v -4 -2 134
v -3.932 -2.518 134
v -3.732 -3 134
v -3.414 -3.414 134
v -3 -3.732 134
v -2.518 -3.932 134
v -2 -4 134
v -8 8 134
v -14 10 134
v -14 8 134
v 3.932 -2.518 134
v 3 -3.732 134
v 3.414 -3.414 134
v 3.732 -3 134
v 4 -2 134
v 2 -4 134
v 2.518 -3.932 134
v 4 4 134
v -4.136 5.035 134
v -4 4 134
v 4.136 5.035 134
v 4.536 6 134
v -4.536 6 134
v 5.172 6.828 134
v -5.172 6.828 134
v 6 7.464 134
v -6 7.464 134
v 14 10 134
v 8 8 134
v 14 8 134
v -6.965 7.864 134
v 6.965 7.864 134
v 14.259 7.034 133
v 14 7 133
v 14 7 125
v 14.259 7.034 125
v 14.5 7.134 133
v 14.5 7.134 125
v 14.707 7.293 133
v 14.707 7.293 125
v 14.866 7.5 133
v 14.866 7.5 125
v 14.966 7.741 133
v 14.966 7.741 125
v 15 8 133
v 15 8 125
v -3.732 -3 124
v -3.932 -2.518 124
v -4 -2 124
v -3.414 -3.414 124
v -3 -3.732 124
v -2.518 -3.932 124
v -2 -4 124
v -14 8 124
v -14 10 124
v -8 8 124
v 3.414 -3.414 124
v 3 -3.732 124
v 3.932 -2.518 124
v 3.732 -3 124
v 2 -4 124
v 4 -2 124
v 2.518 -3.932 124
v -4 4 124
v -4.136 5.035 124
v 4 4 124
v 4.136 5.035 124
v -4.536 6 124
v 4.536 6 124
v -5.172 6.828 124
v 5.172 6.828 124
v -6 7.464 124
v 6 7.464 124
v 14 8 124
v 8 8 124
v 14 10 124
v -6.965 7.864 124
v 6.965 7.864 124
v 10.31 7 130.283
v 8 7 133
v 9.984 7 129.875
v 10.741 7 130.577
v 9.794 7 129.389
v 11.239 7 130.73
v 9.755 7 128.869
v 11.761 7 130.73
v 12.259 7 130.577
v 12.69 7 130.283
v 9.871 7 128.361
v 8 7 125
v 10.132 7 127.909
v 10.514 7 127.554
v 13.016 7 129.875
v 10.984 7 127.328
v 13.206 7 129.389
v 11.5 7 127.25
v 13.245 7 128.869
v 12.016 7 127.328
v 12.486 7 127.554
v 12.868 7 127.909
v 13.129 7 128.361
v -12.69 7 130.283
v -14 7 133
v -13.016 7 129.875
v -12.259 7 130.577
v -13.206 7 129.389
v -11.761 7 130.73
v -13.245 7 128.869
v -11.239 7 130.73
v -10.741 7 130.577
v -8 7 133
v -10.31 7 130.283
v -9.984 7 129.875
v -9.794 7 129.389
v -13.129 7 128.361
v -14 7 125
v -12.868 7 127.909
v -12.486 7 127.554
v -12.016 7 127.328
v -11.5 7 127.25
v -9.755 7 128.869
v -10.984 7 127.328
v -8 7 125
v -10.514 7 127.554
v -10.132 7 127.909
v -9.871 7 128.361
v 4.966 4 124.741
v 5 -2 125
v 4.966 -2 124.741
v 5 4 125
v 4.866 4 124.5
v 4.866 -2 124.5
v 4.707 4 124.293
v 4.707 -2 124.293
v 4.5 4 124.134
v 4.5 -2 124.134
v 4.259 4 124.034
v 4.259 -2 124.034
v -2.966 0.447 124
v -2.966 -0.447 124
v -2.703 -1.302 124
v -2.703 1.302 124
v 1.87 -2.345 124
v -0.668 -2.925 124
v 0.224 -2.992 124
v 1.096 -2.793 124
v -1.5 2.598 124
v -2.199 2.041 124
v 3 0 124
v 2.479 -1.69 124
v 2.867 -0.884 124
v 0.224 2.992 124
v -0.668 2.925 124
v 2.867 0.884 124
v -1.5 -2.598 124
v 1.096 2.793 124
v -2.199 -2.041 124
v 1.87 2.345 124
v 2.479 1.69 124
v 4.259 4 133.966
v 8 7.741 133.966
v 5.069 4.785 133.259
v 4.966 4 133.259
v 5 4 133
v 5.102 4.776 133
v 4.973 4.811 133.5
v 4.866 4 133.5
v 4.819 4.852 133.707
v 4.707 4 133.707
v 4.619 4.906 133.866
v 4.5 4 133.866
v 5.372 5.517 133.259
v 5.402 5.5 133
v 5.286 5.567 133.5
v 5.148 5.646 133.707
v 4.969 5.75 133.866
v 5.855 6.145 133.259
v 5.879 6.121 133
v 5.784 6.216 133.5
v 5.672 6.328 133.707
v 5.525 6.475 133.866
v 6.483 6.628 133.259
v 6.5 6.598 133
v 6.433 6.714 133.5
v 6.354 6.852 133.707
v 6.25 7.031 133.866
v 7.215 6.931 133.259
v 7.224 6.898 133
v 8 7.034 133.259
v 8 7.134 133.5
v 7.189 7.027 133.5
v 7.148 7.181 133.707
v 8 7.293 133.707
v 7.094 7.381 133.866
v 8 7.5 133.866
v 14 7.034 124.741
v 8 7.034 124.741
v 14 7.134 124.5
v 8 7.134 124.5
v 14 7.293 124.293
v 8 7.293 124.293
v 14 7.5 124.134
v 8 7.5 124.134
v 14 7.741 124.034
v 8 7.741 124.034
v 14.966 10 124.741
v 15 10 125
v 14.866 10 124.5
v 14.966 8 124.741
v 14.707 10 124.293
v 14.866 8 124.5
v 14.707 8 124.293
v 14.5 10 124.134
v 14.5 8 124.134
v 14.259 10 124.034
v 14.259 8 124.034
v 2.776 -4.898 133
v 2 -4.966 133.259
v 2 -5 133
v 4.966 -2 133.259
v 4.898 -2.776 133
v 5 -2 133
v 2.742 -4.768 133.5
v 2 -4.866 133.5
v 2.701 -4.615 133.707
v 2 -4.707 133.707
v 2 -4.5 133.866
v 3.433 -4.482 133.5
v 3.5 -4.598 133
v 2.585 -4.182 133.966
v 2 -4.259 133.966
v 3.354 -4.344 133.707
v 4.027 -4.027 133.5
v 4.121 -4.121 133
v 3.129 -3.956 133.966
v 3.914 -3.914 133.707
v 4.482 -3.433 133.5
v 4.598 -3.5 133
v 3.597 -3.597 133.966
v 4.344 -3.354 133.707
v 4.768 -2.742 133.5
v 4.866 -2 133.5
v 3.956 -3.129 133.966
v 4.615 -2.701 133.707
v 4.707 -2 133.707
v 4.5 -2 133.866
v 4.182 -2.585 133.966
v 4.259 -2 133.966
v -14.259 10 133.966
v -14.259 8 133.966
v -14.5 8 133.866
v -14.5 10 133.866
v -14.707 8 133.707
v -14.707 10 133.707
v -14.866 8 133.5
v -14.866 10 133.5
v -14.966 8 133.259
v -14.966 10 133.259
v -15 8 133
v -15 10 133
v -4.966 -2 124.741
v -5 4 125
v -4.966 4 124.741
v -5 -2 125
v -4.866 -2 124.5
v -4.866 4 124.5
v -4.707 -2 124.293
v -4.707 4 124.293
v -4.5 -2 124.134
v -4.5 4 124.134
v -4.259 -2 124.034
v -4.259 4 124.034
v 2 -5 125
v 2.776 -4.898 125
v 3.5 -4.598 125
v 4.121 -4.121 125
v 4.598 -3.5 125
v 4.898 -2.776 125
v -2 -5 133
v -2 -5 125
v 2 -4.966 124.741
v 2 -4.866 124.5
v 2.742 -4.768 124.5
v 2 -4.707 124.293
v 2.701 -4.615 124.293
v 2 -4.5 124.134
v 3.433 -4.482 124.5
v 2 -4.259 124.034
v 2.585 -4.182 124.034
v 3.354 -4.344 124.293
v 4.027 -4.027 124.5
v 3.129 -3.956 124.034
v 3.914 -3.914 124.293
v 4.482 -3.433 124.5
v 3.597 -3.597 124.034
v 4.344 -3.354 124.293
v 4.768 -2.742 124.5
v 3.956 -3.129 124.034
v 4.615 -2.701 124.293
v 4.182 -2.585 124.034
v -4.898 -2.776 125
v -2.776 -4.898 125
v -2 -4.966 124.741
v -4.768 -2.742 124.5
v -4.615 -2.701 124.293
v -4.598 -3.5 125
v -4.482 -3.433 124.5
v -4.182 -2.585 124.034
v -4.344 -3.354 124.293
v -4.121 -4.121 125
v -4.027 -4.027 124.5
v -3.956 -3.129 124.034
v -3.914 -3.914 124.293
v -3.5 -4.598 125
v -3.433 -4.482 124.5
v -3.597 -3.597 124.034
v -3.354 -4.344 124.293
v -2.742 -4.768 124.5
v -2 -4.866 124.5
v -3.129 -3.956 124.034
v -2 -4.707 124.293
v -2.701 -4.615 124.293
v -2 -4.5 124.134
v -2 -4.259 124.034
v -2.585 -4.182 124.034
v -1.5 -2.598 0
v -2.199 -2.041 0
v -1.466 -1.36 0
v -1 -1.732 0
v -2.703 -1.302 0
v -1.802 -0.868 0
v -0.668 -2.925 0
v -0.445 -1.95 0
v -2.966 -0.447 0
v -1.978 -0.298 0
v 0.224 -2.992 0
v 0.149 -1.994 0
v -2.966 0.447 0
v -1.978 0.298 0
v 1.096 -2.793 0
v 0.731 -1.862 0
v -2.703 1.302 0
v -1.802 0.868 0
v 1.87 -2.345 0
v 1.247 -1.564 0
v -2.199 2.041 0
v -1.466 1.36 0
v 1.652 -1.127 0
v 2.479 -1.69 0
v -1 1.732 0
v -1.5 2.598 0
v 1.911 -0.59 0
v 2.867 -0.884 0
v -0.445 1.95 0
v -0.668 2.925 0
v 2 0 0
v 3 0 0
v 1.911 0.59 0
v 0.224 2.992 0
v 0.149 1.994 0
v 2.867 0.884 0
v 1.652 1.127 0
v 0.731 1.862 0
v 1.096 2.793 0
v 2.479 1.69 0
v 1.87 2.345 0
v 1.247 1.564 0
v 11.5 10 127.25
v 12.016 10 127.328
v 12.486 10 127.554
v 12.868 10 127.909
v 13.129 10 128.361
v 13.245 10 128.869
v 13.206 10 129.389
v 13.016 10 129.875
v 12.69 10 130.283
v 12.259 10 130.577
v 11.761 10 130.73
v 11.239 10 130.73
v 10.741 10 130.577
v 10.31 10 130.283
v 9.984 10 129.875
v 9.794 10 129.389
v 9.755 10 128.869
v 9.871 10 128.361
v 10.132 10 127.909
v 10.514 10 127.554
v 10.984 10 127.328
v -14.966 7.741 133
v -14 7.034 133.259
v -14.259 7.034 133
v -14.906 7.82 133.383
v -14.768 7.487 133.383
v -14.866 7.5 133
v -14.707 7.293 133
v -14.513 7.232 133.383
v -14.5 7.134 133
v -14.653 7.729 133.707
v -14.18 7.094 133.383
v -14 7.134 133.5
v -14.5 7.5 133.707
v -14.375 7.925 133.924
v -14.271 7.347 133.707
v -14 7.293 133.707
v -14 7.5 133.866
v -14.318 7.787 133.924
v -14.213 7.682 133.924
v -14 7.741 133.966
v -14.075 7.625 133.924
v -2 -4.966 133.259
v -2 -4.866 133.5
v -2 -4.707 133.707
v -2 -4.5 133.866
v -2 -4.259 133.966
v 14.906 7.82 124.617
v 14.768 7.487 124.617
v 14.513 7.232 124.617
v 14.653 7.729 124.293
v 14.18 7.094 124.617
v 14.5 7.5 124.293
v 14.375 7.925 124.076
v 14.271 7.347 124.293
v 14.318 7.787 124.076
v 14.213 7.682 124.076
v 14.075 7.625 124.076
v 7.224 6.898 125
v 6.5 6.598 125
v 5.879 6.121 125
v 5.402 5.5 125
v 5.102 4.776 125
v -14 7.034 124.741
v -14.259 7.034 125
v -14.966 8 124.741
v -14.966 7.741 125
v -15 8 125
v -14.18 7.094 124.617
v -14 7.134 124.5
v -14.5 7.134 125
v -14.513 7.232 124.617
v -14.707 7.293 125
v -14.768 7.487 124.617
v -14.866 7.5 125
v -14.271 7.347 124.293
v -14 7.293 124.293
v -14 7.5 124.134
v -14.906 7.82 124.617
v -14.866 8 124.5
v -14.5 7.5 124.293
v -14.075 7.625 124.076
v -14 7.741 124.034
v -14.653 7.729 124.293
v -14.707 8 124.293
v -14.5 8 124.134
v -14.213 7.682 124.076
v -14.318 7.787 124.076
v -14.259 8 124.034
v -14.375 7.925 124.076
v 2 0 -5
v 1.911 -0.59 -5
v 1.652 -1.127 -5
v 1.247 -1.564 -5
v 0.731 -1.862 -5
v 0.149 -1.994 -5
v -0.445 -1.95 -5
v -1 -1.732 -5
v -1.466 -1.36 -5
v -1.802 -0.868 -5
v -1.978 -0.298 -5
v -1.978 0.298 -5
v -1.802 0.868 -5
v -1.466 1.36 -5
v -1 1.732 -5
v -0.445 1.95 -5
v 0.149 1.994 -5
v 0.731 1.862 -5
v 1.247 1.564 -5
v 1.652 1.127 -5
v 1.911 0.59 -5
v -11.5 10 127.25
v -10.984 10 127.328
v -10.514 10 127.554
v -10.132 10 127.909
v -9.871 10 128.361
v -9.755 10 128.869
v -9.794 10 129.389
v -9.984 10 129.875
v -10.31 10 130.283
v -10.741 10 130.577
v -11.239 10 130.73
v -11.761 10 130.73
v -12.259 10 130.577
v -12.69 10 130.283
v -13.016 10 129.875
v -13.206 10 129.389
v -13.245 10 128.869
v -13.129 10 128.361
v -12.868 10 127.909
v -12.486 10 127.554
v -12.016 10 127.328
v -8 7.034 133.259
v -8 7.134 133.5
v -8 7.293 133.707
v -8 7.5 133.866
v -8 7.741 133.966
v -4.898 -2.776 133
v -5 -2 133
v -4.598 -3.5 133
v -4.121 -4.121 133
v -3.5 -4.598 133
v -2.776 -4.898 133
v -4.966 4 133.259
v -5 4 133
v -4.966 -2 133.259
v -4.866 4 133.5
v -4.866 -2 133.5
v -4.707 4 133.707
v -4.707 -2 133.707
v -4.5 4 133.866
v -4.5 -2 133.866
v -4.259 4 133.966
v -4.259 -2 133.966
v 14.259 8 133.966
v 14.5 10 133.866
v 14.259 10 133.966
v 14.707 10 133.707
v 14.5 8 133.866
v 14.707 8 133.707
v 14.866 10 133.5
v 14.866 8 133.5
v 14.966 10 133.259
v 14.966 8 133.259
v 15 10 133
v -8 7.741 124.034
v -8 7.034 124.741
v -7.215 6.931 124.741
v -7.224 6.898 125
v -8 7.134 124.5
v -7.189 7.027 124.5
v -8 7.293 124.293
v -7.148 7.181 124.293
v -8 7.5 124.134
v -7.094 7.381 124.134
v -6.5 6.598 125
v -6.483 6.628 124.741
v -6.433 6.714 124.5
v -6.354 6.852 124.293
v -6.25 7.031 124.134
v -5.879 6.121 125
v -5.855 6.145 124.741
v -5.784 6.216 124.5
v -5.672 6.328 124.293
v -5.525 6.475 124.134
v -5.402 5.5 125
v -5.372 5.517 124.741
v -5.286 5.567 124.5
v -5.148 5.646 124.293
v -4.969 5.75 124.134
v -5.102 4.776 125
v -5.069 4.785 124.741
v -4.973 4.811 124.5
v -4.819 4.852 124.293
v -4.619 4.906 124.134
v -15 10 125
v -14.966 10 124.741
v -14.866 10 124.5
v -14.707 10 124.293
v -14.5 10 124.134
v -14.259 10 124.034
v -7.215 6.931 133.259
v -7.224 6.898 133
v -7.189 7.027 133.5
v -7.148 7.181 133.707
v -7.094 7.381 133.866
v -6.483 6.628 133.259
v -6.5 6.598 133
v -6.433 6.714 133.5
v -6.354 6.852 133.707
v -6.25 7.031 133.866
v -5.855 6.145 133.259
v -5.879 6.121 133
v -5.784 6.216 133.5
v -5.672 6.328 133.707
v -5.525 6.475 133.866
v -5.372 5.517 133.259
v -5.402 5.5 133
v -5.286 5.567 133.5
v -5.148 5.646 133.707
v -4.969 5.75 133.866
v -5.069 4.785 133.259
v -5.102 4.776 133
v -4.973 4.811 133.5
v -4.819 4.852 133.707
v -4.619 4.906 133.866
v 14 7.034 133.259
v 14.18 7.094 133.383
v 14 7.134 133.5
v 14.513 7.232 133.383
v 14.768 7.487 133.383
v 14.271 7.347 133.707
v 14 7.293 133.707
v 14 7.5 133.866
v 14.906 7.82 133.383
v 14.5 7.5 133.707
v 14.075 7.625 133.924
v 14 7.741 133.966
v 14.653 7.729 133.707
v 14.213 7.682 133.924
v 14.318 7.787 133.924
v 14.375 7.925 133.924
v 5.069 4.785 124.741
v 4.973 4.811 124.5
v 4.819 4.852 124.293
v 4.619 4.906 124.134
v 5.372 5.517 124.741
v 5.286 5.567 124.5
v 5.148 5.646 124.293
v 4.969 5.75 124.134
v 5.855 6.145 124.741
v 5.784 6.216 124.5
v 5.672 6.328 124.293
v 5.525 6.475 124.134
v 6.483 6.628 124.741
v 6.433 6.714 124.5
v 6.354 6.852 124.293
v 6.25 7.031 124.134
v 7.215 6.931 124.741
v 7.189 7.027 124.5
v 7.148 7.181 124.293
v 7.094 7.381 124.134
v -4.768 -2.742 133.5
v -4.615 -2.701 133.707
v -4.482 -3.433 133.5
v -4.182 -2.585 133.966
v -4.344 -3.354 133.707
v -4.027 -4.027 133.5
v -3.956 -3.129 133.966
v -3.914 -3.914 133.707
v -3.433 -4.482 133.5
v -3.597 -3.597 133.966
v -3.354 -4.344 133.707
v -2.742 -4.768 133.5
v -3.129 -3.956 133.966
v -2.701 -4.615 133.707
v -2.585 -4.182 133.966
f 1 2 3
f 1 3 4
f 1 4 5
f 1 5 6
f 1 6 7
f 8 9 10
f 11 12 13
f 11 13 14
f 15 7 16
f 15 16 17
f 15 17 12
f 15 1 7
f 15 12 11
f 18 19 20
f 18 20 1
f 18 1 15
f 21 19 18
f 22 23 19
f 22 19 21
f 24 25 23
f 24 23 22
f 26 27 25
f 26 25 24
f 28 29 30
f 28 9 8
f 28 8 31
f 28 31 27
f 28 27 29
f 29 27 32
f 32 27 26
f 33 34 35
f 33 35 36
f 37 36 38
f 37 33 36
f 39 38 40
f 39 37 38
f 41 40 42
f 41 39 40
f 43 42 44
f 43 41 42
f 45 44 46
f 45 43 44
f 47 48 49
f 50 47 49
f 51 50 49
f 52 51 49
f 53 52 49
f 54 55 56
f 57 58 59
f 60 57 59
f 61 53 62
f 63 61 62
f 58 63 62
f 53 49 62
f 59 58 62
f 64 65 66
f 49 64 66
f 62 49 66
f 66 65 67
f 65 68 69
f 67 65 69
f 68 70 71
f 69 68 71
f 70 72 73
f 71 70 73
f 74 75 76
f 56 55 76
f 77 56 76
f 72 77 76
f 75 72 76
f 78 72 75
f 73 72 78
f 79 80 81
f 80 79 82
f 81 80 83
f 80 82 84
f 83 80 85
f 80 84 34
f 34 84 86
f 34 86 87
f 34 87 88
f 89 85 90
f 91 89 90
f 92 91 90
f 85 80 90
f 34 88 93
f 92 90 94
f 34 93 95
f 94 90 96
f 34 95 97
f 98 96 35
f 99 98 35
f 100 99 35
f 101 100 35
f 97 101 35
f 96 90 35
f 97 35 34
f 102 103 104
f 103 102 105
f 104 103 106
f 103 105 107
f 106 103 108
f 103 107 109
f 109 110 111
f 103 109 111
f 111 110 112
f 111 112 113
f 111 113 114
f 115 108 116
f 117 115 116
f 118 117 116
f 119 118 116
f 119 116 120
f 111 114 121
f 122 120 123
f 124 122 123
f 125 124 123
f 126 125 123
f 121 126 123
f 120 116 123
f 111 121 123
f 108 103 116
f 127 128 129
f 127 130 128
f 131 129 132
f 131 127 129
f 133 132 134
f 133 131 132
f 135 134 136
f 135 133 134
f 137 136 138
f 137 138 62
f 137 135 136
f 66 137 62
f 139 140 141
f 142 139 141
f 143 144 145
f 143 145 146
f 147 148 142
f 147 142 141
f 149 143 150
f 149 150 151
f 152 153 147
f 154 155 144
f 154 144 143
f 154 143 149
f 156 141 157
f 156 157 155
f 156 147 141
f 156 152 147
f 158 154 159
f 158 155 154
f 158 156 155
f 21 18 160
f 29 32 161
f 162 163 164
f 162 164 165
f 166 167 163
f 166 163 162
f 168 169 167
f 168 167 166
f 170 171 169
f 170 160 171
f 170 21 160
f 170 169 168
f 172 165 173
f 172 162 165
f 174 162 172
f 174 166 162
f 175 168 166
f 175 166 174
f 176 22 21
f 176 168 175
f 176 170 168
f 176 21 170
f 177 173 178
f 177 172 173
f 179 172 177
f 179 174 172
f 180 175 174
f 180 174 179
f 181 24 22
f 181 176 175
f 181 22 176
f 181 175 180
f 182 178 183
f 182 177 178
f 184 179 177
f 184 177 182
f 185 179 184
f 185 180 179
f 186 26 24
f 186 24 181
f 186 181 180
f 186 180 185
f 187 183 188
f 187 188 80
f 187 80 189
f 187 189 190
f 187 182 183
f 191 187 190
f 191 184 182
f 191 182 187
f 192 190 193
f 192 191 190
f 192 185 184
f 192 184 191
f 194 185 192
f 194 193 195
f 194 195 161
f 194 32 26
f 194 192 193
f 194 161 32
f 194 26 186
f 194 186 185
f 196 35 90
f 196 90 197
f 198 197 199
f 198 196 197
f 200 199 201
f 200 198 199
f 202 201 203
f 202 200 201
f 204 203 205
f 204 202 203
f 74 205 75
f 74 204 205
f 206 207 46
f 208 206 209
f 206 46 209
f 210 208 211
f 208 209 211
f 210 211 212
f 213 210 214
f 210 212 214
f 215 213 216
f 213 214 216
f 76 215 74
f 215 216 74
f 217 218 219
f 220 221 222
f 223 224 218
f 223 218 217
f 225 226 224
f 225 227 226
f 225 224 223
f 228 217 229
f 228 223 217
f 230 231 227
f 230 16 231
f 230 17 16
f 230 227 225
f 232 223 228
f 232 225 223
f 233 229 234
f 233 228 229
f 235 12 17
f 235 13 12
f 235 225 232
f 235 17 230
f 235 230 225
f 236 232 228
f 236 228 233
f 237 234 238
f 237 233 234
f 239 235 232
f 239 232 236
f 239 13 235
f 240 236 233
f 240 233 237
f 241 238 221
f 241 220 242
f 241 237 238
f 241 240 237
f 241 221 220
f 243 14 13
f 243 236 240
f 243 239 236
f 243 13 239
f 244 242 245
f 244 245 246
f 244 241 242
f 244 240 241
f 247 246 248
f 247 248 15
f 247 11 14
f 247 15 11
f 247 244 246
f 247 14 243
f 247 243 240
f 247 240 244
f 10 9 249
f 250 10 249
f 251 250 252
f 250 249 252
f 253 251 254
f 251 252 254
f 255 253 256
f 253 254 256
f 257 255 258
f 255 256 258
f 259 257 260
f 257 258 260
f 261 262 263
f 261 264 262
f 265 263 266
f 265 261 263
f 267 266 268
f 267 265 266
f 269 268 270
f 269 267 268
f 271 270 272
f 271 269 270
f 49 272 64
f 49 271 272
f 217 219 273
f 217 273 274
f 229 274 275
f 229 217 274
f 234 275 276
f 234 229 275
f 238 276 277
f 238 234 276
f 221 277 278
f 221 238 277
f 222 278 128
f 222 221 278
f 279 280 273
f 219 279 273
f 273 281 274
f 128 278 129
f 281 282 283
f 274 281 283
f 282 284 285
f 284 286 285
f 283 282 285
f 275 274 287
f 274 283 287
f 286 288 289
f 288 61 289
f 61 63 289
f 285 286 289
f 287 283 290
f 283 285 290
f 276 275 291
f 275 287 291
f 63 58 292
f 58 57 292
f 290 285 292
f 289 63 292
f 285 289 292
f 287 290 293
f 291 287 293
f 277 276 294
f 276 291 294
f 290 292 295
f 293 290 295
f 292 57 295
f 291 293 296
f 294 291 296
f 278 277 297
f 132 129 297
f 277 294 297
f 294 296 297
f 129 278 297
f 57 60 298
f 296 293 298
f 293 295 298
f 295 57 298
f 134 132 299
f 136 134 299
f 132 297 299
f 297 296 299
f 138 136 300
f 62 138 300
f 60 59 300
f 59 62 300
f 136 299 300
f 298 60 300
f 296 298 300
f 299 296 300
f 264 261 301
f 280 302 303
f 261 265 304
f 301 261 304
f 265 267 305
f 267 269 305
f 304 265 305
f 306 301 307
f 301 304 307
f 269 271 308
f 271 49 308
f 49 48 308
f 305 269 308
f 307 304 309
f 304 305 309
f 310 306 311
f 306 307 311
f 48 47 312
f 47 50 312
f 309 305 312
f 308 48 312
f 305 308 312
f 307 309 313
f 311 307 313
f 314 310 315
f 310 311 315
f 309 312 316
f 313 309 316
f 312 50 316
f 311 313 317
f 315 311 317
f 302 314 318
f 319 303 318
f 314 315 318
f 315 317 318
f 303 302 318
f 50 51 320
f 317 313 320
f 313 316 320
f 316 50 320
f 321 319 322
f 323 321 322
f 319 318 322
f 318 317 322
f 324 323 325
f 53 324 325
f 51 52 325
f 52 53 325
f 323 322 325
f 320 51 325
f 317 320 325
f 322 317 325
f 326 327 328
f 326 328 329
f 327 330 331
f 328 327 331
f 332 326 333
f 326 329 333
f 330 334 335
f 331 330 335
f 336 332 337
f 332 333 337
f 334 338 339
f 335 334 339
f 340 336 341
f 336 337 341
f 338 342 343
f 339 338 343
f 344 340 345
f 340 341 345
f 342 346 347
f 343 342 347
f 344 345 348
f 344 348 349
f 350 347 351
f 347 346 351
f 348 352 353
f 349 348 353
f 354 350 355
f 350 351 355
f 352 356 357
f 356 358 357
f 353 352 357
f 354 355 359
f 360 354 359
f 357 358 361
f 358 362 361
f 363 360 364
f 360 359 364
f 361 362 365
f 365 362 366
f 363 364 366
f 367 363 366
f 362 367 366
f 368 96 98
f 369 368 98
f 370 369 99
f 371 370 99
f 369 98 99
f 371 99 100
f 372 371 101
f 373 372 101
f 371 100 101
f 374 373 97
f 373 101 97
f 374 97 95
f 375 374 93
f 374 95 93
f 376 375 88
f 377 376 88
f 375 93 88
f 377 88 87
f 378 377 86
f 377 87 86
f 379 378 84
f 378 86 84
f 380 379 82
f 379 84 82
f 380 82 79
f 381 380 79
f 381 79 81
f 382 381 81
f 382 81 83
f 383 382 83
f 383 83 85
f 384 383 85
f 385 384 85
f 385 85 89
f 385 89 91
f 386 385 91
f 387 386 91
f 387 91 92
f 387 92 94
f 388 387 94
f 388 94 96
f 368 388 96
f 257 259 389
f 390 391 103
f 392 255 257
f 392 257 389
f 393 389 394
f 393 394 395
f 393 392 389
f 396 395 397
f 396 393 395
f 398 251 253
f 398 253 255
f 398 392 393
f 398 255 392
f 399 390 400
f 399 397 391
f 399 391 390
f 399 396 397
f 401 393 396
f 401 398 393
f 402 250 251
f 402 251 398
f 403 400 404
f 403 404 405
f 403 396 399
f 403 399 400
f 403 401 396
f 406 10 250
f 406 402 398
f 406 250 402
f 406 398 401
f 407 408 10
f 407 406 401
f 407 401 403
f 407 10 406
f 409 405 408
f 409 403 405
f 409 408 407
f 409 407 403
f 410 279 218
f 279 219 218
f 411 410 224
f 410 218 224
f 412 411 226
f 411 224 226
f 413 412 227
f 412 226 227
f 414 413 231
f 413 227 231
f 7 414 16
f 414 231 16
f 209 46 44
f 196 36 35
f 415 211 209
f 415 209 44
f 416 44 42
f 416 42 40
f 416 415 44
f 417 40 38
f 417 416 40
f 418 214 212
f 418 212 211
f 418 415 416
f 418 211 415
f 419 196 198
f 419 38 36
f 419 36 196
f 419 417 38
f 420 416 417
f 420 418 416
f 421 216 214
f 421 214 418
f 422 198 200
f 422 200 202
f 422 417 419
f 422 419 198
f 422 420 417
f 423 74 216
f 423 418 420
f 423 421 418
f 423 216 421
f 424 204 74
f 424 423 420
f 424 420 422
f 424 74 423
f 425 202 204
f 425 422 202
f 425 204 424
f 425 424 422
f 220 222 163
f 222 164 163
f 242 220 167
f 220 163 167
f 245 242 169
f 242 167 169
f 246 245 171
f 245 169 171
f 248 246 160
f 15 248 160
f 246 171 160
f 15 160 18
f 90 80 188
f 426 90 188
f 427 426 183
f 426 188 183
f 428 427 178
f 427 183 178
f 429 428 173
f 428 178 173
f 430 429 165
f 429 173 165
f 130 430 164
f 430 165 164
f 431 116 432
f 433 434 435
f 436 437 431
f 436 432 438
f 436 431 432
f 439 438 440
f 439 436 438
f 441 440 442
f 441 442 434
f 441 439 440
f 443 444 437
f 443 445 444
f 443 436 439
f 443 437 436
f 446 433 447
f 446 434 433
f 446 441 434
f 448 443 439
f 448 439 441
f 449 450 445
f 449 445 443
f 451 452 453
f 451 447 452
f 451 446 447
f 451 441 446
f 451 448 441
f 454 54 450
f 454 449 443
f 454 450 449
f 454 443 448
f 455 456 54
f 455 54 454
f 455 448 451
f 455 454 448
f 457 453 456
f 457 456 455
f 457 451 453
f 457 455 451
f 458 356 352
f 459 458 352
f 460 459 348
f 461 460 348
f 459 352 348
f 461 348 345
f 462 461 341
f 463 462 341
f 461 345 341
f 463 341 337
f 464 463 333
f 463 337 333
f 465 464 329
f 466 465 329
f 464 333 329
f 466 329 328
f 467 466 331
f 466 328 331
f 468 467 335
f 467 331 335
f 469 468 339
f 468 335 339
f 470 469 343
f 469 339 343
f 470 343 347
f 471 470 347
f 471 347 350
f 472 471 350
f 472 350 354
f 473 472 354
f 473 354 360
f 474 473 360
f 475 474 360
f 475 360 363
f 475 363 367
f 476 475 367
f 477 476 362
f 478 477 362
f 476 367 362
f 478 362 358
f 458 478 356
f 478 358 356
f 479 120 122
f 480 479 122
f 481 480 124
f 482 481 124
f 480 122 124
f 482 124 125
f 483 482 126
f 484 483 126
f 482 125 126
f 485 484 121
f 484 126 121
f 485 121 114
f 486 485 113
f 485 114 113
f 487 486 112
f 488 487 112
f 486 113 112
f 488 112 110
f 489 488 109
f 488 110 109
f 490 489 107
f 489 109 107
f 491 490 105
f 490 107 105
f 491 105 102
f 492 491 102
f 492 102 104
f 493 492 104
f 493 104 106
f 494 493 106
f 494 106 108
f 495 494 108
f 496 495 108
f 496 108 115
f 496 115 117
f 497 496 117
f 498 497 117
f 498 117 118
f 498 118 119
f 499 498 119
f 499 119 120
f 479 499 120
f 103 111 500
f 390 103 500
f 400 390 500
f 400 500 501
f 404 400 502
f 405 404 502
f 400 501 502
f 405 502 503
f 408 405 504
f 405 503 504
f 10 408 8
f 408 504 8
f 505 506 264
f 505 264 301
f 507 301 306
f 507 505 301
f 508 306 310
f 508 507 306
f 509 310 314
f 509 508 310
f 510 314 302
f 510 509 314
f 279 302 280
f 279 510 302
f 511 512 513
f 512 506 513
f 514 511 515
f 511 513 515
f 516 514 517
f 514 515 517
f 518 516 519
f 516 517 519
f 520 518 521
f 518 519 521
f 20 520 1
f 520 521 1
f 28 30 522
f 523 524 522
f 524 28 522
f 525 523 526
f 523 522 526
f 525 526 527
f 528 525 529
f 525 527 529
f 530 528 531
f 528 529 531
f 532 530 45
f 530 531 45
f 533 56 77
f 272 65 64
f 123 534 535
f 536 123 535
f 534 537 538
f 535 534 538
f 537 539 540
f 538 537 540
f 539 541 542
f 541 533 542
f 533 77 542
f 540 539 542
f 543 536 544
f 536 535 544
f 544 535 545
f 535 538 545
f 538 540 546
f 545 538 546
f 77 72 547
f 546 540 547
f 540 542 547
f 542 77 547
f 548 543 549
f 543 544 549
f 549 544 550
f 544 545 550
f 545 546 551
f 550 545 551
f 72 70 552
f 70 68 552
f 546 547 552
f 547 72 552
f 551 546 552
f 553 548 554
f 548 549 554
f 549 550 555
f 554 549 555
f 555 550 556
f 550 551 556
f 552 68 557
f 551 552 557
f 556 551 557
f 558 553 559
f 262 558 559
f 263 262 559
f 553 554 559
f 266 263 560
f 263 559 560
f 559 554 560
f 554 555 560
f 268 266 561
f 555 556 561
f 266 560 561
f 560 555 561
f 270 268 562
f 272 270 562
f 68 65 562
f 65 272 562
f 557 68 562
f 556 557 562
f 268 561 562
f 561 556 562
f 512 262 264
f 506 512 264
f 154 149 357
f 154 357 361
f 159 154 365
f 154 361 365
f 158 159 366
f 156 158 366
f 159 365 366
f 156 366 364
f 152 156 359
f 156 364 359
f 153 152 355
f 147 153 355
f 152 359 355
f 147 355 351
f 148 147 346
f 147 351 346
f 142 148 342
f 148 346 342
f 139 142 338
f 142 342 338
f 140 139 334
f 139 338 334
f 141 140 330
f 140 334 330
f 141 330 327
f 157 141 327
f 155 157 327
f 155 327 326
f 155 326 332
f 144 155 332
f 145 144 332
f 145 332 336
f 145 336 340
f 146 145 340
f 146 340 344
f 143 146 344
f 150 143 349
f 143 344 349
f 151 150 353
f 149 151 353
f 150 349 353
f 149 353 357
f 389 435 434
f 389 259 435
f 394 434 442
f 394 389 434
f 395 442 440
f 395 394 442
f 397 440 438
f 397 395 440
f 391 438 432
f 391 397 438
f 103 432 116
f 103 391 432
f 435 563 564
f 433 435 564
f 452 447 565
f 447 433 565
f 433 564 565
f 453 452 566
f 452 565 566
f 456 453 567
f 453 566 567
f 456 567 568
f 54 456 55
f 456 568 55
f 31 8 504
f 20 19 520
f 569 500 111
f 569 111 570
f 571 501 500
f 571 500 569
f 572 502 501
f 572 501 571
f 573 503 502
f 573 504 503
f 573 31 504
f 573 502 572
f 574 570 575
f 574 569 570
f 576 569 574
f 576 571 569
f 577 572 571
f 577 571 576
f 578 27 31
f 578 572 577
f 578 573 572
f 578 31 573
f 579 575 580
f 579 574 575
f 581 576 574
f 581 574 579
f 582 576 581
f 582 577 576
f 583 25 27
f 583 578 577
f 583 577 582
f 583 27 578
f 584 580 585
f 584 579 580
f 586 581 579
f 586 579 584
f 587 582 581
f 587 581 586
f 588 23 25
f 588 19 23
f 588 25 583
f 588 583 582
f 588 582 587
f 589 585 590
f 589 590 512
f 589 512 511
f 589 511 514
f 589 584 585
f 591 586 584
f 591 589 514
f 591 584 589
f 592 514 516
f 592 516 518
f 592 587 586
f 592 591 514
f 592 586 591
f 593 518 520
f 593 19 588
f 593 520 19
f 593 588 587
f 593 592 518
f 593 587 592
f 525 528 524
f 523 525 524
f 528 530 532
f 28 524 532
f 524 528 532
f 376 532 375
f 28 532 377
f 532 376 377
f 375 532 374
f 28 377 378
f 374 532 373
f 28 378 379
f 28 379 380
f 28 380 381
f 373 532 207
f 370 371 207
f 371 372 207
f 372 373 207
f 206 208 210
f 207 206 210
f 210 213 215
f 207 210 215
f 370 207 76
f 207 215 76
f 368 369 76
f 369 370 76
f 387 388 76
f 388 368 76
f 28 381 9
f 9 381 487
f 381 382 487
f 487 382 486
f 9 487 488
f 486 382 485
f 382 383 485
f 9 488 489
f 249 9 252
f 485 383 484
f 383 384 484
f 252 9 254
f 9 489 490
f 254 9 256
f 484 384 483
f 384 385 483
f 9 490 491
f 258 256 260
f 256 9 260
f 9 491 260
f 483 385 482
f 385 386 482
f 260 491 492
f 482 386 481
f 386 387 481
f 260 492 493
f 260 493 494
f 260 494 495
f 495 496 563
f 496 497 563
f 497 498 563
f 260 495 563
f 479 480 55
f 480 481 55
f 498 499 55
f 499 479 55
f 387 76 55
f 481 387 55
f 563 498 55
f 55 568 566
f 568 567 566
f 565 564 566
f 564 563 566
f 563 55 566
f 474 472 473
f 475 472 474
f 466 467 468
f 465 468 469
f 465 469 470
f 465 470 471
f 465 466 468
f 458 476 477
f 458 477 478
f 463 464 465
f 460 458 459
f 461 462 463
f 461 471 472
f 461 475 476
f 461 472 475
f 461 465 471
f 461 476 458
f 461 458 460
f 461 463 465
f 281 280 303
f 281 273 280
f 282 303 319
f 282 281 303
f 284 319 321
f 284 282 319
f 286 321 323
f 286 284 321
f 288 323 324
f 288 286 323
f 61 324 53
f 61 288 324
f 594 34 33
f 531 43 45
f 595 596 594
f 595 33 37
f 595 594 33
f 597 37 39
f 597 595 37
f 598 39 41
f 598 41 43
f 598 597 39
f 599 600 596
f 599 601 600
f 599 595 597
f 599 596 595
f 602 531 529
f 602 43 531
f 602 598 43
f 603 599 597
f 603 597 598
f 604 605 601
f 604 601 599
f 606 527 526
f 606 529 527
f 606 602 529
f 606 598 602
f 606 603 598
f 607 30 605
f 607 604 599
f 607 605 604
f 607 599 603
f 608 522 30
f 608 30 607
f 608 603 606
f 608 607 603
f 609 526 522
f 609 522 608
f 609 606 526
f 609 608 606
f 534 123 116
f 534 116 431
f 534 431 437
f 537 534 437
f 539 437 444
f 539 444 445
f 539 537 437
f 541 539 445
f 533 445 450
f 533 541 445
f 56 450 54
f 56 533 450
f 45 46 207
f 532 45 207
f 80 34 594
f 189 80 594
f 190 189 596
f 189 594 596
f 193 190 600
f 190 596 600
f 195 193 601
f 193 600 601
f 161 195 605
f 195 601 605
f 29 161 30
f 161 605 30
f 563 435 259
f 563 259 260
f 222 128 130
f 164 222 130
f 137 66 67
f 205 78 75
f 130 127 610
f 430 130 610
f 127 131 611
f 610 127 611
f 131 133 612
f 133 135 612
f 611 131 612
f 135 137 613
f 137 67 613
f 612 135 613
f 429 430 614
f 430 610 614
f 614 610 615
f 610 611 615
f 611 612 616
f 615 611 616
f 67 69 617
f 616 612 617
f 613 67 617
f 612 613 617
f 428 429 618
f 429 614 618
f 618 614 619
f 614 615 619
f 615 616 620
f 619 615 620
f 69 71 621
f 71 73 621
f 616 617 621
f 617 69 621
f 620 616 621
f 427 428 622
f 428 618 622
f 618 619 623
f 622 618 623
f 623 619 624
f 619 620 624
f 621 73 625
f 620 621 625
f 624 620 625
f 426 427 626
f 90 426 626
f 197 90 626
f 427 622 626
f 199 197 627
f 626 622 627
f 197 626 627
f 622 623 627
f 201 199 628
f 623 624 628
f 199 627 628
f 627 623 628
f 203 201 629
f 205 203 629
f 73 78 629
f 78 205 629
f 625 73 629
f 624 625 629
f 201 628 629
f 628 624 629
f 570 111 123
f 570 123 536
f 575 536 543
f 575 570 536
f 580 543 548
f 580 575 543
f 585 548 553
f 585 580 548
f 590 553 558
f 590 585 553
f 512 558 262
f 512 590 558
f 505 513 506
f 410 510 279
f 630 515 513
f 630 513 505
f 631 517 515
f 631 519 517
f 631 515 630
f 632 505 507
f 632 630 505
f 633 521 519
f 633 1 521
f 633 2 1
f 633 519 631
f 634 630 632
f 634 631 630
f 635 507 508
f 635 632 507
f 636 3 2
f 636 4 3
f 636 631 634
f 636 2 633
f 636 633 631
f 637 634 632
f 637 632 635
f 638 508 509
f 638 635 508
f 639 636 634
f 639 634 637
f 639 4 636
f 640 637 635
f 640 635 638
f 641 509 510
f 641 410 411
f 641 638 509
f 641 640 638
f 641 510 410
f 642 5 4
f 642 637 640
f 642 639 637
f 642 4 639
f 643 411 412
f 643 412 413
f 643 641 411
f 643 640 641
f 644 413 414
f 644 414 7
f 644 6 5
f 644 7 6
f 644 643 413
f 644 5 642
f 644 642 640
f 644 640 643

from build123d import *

# Parameters (mm, degrees)
SKETCH_1_R          = 3
EXTRUDE_1_DEPTH     = 124
SKETCH_2_R          = 2
EXTRUDE_2_DEPTH     = 5
SKETCH_4_W          = 10
SKETCH_4_H          = 3
EXTRUDE_4_DEPTH     = 10
FILLET_6_R          = 3
FILLET_7_R          = 1
SKETCH_5_R          = 1.75
CUT_EXTRUDE_1_DEPTH = 136.369863806
FILLET_8_R          = 1


with BuildPart() as part:
    # ｽｹｯﾁ1 → ﾎﾞｽ - 押し出し1 (new body)
    with BuildSketch(Plane.XY):
        Circle(SKETCH_1_R)
    extrude(amount=EXTRUDE_1_DEPTH)

    # ｽｹｯﾁ2 → ﾎﾞｽ - 押し出し2 (add)
    with BuildSketch(Plane(origin=(0, 0, 0), x_dir=(-1, 0, 0), z_dir=(0, 0, -1))):
        with Locations(Location((0, 0, 0), (0, 0, 180))):
            Circle(SKETCH_2_R)
    extrude(amount=EXTRUDE_2_DEPTH)


with BuildPart() as body_2:
    # ｽｹｯﾁ4 → ﾎﾞｽ - 押し出し4 (new body)
    with BuildSketch(Plane.XY.offset(124)):
        with Locations((10, 8.5)):
            Rectangle(SKETCH_4_W, SKETCH_4_H)
        with BuildLine():
            Line((5, 10), (0, 10))
            Line((0, 10), (0, 3))
            ThreePointArc((0, 3), (2.121320344, 2.121320344), (3, 0))
            ThreePointArc((3, 0), (2.121320344, -2.121320344), (0, -3))
            Line((0, -3), (0, -5))
            Line((0, -5), (5, -5))
            Line((5, -5), (5, 7))
            Line((5, 7), (5, 10))
        make_face()
        with BuildLine():
            Line((0, 3), (0, 10))
            Line((0, 10), (-5, 10))
            Line((-5, 10), (-5, 7))
            Line((-5, 7), (-5, -5))
            Line((-5, -5), (0, -5))
            Line((0, -5), (0, -3))
            ThreePointArc((0, -3), (-3, 0), (0, 3))
        make_face()
        with Locations((-10, 8.5)):
            Rectangle(SKETCH_4_W, SKETCH_4_H)
        with BuildLine():
            ThreePointArc((3, 0), (2.121320344, 2.121320344), (0, 3))
            Line((0, 3), (0, -3))
            ThreePointArc((0, -3), (2.121320344, -2.121320344), (3, 0))
        make_face()
        with BuildLine():
            Line((0, -3), (0, 3))
            ThreePointArc((0, 3), (-3, 0), (0, -3))
        make_face()
    extrude(amount=EXTRUDE_4_DEPTH)

    # ﾌｨﾚｯﾄ6
    fillet_6_edges = [body_2.edges().sort_by_distance(p)[0] for p in [
        (5, 7, 129),
        (5, -5, 129),
        (-5, -5, 129),
        (-5, 7, 129),
    ]]
    fillet(fillet_6_edges, radius=FILLET_6_R)

    # ﾌｨﾚｯﾄ7
    fillet_7_edges = [body_2.edges().sort_by_distance(p)[0] for p in [
        (15, 7, 129),
        (-15, 7, 129),
        (11.5, 7, 124),
        (11.5, 7, 134),
        (5, 1, 124),
        (5, 1, 134),
        (-5, 1, 124),
        (-5, 1, 134),
        (-11.5, 7, 124),
        (-11.5, 7, 134),
        (0, -5, 124),
        (-4.121320344, -4.121320344, 124),
        (4.121320344, -4.121320344, 124),
        (0, -5, 134),
        (-4.121320344, -4.121320344, 134),
        (4.121320344, -4.121320344, 134),
        (5.878679656, 6.121320344, 124),
        (5.878679656, 6.121320344, 134),
        (-5.878679656, 6.121320344, 124),
        (-5.878679656, 6.121320344, 134),
    ]]
    fillet(fillet_7_edges, radius=FILLET_7_R)

    # ｽｹｯﾁ5 → ｶｯﾄ - 押し出し1 (cut, through all)
    with BuildSketch(Plane(origin=(0, 7, 0), x_dir=(-1, 0, 0), z_dir=(0, -1, 0))):
        with Locations(Location((-11.5, -129, 0), (0, 0, 90))):
            Circle(SKETCH_5_R)
        with Locations(Location((11.5, -129, 0), (0, 0, 90))):
            Circle(SKETCH_5_R)
    extrude(amount=-CUT_EXTRUDE_1_DEPTH, mode=Mode.SUBTRACT)

    # ﾌｨﾚｯﾄ8
    # the kernel refuses this fillet: 1 mm, written as the material it takes off along each edge
    with BuildSketch(Plane(origin=(14, 8, 125), x_dir=(1, 0, 0), z_dir=(0, 0, -1))) as fillet_8_piece_1_section:
        Polygon((0, 0), (FILLET_8_R, 0), (FILLET_8_R, FILLET_8_R), (0, FILLET_8_R), align=None)
    fillet_8_piece_1 = extrude(amount=FILLET_8_R, mode=Mode.PRIVATE)
    fillet_8_piece_1 = fillet_8_piece_1 - Plane(origin=(14, 8, 125), x_dir=(-0.7071067811865472, 0.7071067811865477, 0), z_dir=(0, 0, -1)) * Sphere(FILLET_8_R, mode=Mode.PRIVATE)
    add(fillet_8_piece_1, mode=Mode.SUBTRACT)
    with BuildSketch(Plane(origin=(14, 8, 133), x_dir=(1, 0, 0), z_dir=(0, 0, 1))) as fillet_8_piece_2_section:
        Polygon((0, 0), (FILLET_8_R, 0), (FILLET_8_R, -FILLET_8_R), (0, -FILLET_8_R), align=None)
    fillet_8_piece_2 = extrude(amount=FILLET_8_R, mode=Mode.PRIVATE)
    fillet_8_piece_2 = fillet_8_piece_2 - Plane(origin=(14, 8, 133), x_dir=(-0.7071067811865472, 0.7071067811865477, 0), z_dir=(0, 0, 1)) * Sphere(FILLET_8_R, mode=Mode.PRIVATE)
    add(fillet_8_piece_2, mode=Mode.SUBTRACT)
    with BuildSketch(Plane(origin=(-14, 8, 125), x_dir=(-1, 0, 0), z_dir=(0, 0, -1))) as fillet_8_piece_3_section:
        Polygon((0, 0), (FILLET_8_R, 0), (FILLET_8_R, -FILLET_8_R), (0, -FILLET_8_R), align=None)
    fillet_8_piece_3 = extrude(amount=FILLET_8_R, mode=Mode.PRIVATE)
    fillet_8_piece_3 = fillet_8_piece_3 - Plane(origin=(-14, 8, 125), x_dir=(0.7071067811865472, 0.7071067811865477, 0), z_dir=(0, 0, -1)) * Sphere(FILLET_8_R, mode=Mode.PRIVATE)
    add(fillet_8_piece_3, mode=Mode.SUBTRACT)
    with BuildSketch(Plane(origin=(-14, 8, 133), x_dir=(-1, 0, 0), z_dir=(0, 0, 1))) as fillet_8_piece_4_section:
        Polygon((0, 0), (FILLET_8_R, 0), (FILLET_8_R, FILLET_8_R), (0, FILLET_8_R), align=None)
    fillet_8_piece_4 = extrude(amount=FILLET_8_R, mode=Mode.PRIVATE)
    fillet_8_piece_4 = fillet_8_piece_4 - Plane(origin=(-14, 8, 133), x_dir=(0.7071067811865472, 0.7071067811865477, 0), z_dir=(0, 0, 1)) * Sphere(FILLET_8_R, mode=Mode.PRIVATE)
    add(fillet_8_piece_4, mode=Mode.SUBTRACT)
    with BuildSketch(Plane(origin=(-15, 12.5, 124), x_dir=(1, 0, 0), z_dir=(0, -1, 0)), Plane(origin=(15, 8, 124), x_dir=(-1, 0, 0), z_dir=(0, 1, 0))) as fillet_8_piece_5:
        with BuildLine():
            CenterArc((FILLET_8_R, FILLET_8_R), FILLET_8_R, 180, 90)
            Line((0, FILLET_8_R), (0, 0))
            Line((0, 0), (FILLET_8_R, 0))
        make_face()
    extrude(amount=4.5, mode=Mode.SUBTRACT)
    with BuildSketch(Plane(origin=(-15, 12.5, 134), x_dir=(1, 0, 0), z_dir=(0, -1, 0)), Plane(origin=(15, 8, 134), x_dir=(-1, 0, 0), z_dir=(0, 1, 0))) as fillet_8_piece_6:
        with BuildLine():
            CenterArc((FILLET_8_R, -FILLET_8_R), FILLET_8_R, 90, 90)
            Line((0, -FILLET_8_R), (0, 0))
            Line((0, 0), (FILLET_8_R, 0))
        make_face()
    extrude(amount=4.5, mode=Mode.SUBTRACT)


solid = Compound([part.part, body_2.part])
